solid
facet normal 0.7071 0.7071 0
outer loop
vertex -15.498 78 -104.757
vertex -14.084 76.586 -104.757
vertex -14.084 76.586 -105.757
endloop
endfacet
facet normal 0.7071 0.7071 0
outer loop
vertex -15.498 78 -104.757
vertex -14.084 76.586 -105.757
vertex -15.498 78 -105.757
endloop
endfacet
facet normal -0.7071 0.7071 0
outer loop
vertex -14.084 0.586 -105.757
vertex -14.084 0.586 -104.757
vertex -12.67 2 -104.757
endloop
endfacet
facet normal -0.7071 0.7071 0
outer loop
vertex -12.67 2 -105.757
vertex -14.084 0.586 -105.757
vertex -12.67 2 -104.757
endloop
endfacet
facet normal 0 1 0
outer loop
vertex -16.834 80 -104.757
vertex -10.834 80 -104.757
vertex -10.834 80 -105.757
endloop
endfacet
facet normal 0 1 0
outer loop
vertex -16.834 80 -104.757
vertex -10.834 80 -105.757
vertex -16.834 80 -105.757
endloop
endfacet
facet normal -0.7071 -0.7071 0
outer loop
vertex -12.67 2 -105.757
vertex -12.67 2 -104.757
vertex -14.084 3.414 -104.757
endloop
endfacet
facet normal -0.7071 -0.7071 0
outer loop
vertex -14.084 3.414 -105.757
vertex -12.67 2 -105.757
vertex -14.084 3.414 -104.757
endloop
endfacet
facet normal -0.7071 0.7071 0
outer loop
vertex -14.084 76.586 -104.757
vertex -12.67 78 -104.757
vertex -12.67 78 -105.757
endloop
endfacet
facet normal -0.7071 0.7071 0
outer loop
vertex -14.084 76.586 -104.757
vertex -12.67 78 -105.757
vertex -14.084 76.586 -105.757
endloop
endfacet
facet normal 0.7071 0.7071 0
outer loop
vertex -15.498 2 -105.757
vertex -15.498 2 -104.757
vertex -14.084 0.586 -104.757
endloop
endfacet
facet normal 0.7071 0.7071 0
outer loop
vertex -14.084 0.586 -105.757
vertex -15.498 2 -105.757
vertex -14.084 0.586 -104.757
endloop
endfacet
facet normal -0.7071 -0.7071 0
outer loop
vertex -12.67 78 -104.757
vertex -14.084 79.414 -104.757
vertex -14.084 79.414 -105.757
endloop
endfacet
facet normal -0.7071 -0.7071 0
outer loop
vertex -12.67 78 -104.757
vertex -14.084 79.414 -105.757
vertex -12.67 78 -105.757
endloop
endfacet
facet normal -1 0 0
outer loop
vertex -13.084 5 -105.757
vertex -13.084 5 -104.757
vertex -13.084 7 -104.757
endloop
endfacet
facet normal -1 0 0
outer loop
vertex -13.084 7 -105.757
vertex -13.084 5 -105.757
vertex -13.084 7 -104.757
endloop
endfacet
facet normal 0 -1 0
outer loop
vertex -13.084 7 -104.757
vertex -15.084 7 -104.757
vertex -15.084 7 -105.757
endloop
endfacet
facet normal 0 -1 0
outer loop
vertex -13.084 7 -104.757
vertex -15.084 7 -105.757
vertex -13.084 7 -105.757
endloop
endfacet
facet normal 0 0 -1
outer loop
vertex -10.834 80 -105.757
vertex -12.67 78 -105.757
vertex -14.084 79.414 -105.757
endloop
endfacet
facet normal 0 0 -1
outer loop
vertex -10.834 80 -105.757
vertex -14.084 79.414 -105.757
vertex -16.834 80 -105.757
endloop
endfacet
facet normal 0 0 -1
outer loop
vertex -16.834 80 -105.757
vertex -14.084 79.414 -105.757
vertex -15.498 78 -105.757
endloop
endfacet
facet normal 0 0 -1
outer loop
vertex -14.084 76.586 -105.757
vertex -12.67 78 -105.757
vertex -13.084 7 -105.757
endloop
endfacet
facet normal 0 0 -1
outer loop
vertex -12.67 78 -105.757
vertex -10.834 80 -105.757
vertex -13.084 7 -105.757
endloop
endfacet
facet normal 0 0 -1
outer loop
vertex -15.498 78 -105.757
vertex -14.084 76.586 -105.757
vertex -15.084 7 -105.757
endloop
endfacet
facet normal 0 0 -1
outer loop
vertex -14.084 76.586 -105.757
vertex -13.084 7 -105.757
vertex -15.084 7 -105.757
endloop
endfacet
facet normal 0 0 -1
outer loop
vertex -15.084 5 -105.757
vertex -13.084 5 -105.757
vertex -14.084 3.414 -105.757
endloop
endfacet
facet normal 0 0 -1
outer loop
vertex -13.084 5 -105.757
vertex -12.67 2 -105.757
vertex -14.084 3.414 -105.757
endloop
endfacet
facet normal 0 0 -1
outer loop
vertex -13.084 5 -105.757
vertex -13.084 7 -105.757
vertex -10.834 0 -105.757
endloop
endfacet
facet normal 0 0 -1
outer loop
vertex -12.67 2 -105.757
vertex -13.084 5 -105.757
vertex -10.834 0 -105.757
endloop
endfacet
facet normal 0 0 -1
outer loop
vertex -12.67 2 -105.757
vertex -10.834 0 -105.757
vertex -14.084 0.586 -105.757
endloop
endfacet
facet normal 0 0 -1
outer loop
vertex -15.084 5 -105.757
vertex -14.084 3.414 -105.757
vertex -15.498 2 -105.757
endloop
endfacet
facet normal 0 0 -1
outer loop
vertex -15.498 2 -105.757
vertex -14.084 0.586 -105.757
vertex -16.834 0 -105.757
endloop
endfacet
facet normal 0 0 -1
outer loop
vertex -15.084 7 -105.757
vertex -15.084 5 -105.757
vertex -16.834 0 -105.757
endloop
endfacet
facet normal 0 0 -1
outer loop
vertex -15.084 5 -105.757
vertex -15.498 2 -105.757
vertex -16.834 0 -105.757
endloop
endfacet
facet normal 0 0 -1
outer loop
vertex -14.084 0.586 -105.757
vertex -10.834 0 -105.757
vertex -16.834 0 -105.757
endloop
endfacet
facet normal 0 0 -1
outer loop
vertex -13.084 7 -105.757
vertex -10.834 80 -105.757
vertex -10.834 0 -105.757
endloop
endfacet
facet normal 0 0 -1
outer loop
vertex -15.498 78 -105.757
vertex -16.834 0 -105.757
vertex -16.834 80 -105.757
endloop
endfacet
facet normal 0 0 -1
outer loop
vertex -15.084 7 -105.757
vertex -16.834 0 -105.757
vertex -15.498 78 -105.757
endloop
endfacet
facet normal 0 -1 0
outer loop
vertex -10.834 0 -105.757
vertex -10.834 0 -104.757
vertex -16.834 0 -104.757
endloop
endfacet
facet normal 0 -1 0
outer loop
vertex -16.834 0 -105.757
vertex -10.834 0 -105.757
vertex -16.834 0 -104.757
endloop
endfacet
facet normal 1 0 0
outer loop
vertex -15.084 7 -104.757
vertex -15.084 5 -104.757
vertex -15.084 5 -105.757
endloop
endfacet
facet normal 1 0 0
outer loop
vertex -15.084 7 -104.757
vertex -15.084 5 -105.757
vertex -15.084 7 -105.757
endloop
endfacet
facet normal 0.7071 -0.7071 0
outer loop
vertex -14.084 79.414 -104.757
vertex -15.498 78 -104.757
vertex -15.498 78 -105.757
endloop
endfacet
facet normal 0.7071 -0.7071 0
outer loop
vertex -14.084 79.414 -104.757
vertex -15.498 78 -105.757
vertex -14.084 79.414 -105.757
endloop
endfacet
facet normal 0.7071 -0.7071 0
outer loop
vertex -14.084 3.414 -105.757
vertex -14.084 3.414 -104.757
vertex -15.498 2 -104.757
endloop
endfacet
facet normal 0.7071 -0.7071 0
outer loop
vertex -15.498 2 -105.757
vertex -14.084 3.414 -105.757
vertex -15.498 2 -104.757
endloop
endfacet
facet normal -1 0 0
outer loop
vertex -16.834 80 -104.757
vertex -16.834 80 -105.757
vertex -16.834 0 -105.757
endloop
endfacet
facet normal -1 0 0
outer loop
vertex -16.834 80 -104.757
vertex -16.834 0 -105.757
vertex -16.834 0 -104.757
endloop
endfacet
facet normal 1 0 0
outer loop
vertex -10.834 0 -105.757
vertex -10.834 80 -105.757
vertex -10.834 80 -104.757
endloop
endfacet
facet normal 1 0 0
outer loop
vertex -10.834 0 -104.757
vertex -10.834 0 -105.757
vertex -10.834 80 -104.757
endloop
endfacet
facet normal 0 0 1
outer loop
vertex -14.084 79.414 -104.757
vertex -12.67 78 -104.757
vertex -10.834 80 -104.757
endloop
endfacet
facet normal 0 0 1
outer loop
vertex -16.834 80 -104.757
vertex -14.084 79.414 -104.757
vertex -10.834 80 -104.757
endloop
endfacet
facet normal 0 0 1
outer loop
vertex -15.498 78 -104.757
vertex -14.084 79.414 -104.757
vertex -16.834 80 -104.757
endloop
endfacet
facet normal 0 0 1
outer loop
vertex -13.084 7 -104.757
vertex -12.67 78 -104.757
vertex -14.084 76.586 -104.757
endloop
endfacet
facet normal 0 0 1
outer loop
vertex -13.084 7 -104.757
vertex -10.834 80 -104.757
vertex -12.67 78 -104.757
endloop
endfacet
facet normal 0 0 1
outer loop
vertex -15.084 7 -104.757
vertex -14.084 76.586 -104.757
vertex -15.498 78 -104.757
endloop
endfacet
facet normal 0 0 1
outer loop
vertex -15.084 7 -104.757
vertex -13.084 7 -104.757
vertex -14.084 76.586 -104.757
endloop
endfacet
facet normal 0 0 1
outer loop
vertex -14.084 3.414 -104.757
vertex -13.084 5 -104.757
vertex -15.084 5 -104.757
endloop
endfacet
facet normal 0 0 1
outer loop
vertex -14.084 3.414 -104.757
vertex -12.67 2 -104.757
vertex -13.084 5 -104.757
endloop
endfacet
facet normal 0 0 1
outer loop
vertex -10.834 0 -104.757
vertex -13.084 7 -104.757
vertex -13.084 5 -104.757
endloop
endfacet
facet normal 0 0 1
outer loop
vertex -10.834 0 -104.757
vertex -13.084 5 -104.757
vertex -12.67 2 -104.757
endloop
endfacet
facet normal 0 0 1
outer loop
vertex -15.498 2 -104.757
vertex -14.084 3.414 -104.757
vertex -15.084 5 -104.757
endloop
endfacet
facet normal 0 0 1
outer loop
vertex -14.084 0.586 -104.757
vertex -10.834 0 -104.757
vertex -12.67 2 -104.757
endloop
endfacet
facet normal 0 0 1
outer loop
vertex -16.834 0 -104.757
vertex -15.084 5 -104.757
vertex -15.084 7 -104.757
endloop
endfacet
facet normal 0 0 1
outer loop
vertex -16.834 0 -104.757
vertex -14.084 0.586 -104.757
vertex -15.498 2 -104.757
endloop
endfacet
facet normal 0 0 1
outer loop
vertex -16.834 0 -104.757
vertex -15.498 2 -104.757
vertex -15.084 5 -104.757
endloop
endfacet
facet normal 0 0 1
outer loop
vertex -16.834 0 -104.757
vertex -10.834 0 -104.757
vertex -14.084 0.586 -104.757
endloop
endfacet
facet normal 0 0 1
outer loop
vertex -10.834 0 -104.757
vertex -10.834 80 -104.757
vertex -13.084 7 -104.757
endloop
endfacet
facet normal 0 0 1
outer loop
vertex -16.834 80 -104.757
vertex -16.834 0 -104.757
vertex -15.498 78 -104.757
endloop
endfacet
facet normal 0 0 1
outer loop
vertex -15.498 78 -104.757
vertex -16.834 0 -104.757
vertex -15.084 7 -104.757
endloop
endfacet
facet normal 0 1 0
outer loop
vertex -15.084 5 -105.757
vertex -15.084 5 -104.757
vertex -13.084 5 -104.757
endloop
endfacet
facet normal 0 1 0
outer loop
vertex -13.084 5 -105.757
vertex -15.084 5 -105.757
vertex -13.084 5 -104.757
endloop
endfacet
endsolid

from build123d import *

# Parameters (mm, degrees)
PROFILE_SKETCH_W                  = 6
PROFILE_SKETCH_H                  = 1
PROFILE_EXTRUDE_DEPTH             = 80
FIDUCIAL_CUT_DEPTH                = 82.758091516
FIDUCIAL_1_INDICATOR_SKETCH_W     = 2
FIDUCIAL_1_INDICATOR_SKETCH_H     = 2
INDICATOR_OF_FIDUCIAL_1_CUT_DEPTH = 82.758091516


with BuildPart() as part:
    # Profile Sketch → Profile Extrude (new body)
    with BuildSketch(Plane(origin=(-13.83405858, 0, -105.75669297), x_dir=(-1, 0, 0), z_dir=(0, 1, 0))):
        with Locations((0, 0.5)):
            Rectangle(PROFILE_SKETCH_W, PROFILE_SKETCH_H)
    extrude(amount=PROFILE_EXTRUDE_DEPTH)

    # Fiducial Sketch → Fiducial Cut (cut, through all)
    with BuildSketch(Plane.XY.offset(-104.75669297)):
        Polygon((-12.669845017, 2), (-14.08405858, 3.414213562), (-15.498272142, 2), (-14.08405858, 0.585786438), align=None)
    fiducial_cut = extrude(amount=-FIDUCIAL_CUT_DEPTH, mode=Mode.SUBTRACT)

    # Fiducial Mirror: Fiducial Cut across plane
    add(fiducial_cut.mirror(Plane(origin=(0, 40, 0), x_dir=(0, 0, 1), z_dir=(0, -1, 0))), mode=Mode.SUBTRACT)

    # Fiducial 1 Indicator Sketch → Indicator of Fiducial 1 Cut (cut, through all)
    with BuildSketch(Plane.XY.offset(-104.75669297)):
        with Locations((-14.08405858, 6)):
            Rectangle(FIDUCIAL_1_INDICATOR_SKETCH_W, FIDUCIAL_1_INDICATOR_SKETCH_H)
    extrude(amount=-INDICATOR_OF_FIDUCIAL_1_CUT_DEPTH, mode=Mode.SUBTRACT)


solid = part.part
